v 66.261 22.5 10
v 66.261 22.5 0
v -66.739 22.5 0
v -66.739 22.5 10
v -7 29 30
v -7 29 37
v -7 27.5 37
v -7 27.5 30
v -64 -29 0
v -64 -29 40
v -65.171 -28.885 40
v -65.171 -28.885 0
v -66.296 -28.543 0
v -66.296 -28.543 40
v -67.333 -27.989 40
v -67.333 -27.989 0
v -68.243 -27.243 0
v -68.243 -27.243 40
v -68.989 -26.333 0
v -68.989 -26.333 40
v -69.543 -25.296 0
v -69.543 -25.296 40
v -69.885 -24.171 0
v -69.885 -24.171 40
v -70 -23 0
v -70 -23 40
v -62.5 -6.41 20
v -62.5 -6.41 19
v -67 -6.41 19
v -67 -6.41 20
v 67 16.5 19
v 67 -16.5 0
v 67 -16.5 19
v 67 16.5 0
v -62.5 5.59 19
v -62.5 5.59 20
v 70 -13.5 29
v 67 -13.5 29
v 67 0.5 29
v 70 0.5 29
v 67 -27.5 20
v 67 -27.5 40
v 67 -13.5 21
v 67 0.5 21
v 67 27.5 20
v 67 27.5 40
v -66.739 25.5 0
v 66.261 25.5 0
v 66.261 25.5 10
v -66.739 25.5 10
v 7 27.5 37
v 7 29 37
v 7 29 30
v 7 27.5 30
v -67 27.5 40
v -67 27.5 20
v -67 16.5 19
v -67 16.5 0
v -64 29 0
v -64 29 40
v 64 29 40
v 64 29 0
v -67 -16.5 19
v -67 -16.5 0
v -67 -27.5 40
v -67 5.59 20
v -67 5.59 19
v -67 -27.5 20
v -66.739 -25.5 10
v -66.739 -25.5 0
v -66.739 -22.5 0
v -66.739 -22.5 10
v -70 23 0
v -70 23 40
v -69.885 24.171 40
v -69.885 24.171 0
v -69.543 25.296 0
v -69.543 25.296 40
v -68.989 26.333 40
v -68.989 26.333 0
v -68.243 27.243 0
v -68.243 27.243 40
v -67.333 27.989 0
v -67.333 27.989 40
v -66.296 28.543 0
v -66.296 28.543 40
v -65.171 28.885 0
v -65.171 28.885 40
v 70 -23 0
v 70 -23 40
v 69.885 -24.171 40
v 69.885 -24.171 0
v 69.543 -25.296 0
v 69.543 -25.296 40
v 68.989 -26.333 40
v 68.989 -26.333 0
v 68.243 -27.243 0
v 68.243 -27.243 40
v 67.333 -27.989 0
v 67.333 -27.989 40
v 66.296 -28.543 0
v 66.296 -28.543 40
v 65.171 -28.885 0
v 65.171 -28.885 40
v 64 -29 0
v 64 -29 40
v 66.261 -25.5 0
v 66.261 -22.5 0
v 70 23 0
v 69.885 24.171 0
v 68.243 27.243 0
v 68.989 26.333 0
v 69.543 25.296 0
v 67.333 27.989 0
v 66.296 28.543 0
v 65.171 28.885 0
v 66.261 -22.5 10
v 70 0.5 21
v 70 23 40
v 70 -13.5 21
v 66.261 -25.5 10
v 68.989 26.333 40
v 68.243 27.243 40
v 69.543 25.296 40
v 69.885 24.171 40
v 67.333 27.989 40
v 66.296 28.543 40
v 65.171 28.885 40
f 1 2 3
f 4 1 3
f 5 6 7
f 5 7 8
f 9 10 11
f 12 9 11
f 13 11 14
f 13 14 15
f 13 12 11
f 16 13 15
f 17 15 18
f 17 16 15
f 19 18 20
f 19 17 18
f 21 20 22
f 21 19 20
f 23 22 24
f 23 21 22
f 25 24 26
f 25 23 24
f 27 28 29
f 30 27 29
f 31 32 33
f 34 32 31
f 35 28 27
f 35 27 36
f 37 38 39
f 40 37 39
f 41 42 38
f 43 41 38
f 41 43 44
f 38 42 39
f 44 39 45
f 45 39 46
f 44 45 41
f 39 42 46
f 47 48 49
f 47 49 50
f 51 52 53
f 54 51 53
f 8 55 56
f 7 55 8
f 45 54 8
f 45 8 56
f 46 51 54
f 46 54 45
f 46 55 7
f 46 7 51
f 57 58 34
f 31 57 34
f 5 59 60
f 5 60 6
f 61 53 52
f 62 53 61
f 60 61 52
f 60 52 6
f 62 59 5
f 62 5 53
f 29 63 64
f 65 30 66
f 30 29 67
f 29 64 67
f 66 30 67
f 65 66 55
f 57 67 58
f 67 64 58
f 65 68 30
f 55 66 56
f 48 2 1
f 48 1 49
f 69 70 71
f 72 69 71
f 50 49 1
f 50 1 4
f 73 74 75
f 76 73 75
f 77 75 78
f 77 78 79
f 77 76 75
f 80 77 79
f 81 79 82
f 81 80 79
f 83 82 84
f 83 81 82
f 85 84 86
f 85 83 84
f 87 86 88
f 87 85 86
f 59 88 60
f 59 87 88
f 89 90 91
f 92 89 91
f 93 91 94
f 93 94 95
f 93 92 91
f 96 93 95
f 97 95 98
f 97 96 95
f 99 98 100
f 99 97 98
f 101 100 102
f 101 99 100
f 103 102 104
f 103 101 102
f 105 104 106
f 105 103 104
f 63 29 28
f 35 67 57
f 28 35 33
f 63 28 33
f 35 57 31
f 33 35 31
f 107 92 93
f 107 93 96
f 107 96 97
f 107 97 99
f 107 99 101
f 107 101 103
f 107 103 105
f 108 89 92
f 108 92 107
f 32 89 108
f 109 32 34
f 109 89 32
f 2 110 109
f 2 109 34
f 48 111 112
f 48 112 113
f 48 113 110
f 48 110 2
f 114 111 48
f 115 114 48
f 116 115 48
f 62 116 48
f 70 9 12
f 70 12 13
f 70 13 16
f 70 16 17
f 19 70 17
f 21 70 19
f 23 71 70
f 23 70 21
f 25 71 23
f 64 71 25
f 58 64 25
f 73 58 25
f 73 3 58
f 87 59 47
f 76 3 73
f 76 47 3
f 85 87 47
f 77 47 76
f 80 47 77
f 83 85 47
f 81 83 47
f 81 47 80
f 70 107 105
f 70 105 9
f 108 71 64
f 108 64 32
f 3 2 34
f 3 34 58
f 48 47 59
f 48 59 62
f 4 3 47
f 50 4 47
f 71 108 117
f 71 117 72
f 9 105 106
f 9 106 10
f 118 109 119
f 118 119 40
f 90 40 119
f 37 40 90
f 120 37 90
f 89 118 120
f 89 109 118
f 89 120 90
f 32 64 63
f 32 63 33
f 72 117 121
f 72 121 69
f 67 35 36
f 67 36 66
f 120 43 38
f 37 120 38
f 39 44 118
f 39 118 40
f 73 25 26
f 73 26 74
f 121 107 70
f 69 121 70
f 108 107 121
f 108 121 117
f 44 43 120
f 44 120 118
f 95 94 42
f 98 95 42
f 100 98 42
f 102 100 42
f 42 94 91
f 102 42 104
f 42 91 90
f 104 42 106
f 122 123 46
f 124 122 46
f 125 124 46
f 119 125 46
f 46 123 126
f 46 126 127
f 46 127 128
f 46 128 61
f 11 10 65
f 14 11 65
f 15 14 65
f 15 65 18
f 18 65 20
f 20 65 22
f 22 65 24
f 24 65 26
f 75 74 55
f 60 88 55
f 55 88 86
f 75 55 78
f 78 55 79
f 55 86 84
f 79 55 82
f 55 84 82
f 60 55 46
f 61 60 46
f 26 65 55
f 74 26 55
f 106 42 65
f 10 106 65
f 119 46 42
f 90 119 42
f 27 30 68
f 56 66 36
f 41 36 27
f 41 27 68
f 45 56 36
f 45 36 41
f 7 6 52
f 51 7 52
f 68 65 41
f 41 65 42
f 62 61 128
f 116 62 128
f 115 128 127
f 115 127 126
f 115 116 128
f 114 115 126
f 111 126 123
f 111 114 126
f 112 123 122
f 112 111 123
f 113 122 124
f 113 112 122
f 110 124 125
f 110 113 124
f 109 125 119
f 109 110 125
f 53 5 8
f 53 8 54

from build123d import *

# Parameters (mm, degrees)
SKETCH_1_W          = 134
SKETCH_1_H          = 33
EXTRUDE_1_DEPTH     = 40
EXTRUDE_START       = 19
SKETCH_2_W          = 134
SKETCH_2_H          = 33
EXTRUDE_2_DEPTH     = 3
SKETCH_3_W          = 4.5
SKETCH_3_H          = 12
CUT_EXTRUDE_1_DEPTH = 79.625695545
SKETCH_4_W          = 134
SKETCH_4_H          = 55
CUT_EXTRUDE_2_DEPTH = 20
SKETCH_6_W          = 14
SKETCH_6_H          = 7
CUT_EXTRUDE_3_DEPTH = 10
SKETCH_7_W          = 8
SKETCH_7_H          = 14
CUT_EXTRUDE_4_DEPTH = 10
SKETCH_8_W          = 133
SKETCH_8_H          = 3
CUT_EXTRUDE_5_DEPTH = 10


with BuildPart() as part:
    # 草图1 → 凸台-拉伸1 (new body)
    with BuildSketch(Plane.XY):
        with BuildLine():
            Line((-64, 29), (64, 29))
            ThreePointArc((64, 29), (68.242640687, 27.242640687), (70, 23))
            Line((70, 23), (70, -23))
            ThreePointArc((70, -23), (68.242640687, -27.242640687), (64, -29))
            Line((64, -29), (-64, -29))
            ThreePointArc((-64, -29), (-68.242640687, -27.242640687), (-70, -23))
            Line((-70, -23), (-70, 23))
            ThreePointArc((-70, 23), (-68.242640687, 27.242640687), (-64, 29))
        make_face()
        Rectangle(SKETCH_1_W, SKETCH_1_H, mode=Mode.SUBTRACT)
    extrude(amount=EXTRUDE_1_DEPTH)

    # 草图2 → 凸台-拉伸2 (add)
    with BuildSketch(Plane.XY.offset(EXTRUDE_START)):
        Rectangle(SKETCH_2_W, SKETCH_2_H)
    extrude(amount=EXTRUDE_2_DEPTH)

    # 草图3 → 切除-拉伸1 (cut, through all)
    with BuildSketch(Plane(origin=(0, 0, 19), x_dir=(-1, 0, 0), z_dir=(0, 0, -1))):
        with Locations((64.75, -0.409735633)):
            Rectangle(SKETCH_3_W, SKETCH_3_H)
    extrude(amount=-CUT_EXTRUDE_1_DEPTH, mode=Mode.SUBTRACT)

    # 草图4 → 切除-拉伸2 (cut)
    with BuildSketch(Plane.XY.offset(40)):
        Rectangle(SKETCH_4_W, SKETCH_4_H)
    extrude(amount=-CUT_EXTRUDE_2_DEPTH, mode=Mode.SUBTRACT)

    # 草图6 → 切除-拉伸3 (cut)
    with BuildSketch(Plane(origin=(0, 29, 0), x_dir=(1, 0, 0), z_dir=(0, 1, 0))):
        with Locations((0, -33.5)):
            Rectangle(SKETCH_6_W, SKETCH_6_H)
    extrude(amount=-CUT_EXTRUDE_3_DEPTH, mode=Mode.SUBTRACT)

    # 草图7 → 切除-拉伸4 (cut)
    with BuildSketch(Plane.ZY.offset(-67)):
        with Locations((25, -6.5)):
            Rectangle(SKETCH_7_W, SKETCH_7_H)
    extrude(amount=-CUT_EXTRUDE_4_DEPTH, mode=Mode.SUBTRACT)

    # 草图8 → 切除-拉伸5 (cut)
    with BuildSketch(Plane(origin=(0, 0, 0), x_dir=(-1, 0, 0), z_dir=(0, 0, -1))):
        with Locations((0.239080463, 24)):
            Rectangle(SKETCH_8_W, SKETCH_8_H)
        with Locations((0.239080463, -24)):
            Rectangle(SKETCH_8_W, SKETCH_8_H)
    extrude(amount=-CUT_EXTRUDE_5_DEPTH, mode=Mode.SUBTRACT)


solid = part.part
